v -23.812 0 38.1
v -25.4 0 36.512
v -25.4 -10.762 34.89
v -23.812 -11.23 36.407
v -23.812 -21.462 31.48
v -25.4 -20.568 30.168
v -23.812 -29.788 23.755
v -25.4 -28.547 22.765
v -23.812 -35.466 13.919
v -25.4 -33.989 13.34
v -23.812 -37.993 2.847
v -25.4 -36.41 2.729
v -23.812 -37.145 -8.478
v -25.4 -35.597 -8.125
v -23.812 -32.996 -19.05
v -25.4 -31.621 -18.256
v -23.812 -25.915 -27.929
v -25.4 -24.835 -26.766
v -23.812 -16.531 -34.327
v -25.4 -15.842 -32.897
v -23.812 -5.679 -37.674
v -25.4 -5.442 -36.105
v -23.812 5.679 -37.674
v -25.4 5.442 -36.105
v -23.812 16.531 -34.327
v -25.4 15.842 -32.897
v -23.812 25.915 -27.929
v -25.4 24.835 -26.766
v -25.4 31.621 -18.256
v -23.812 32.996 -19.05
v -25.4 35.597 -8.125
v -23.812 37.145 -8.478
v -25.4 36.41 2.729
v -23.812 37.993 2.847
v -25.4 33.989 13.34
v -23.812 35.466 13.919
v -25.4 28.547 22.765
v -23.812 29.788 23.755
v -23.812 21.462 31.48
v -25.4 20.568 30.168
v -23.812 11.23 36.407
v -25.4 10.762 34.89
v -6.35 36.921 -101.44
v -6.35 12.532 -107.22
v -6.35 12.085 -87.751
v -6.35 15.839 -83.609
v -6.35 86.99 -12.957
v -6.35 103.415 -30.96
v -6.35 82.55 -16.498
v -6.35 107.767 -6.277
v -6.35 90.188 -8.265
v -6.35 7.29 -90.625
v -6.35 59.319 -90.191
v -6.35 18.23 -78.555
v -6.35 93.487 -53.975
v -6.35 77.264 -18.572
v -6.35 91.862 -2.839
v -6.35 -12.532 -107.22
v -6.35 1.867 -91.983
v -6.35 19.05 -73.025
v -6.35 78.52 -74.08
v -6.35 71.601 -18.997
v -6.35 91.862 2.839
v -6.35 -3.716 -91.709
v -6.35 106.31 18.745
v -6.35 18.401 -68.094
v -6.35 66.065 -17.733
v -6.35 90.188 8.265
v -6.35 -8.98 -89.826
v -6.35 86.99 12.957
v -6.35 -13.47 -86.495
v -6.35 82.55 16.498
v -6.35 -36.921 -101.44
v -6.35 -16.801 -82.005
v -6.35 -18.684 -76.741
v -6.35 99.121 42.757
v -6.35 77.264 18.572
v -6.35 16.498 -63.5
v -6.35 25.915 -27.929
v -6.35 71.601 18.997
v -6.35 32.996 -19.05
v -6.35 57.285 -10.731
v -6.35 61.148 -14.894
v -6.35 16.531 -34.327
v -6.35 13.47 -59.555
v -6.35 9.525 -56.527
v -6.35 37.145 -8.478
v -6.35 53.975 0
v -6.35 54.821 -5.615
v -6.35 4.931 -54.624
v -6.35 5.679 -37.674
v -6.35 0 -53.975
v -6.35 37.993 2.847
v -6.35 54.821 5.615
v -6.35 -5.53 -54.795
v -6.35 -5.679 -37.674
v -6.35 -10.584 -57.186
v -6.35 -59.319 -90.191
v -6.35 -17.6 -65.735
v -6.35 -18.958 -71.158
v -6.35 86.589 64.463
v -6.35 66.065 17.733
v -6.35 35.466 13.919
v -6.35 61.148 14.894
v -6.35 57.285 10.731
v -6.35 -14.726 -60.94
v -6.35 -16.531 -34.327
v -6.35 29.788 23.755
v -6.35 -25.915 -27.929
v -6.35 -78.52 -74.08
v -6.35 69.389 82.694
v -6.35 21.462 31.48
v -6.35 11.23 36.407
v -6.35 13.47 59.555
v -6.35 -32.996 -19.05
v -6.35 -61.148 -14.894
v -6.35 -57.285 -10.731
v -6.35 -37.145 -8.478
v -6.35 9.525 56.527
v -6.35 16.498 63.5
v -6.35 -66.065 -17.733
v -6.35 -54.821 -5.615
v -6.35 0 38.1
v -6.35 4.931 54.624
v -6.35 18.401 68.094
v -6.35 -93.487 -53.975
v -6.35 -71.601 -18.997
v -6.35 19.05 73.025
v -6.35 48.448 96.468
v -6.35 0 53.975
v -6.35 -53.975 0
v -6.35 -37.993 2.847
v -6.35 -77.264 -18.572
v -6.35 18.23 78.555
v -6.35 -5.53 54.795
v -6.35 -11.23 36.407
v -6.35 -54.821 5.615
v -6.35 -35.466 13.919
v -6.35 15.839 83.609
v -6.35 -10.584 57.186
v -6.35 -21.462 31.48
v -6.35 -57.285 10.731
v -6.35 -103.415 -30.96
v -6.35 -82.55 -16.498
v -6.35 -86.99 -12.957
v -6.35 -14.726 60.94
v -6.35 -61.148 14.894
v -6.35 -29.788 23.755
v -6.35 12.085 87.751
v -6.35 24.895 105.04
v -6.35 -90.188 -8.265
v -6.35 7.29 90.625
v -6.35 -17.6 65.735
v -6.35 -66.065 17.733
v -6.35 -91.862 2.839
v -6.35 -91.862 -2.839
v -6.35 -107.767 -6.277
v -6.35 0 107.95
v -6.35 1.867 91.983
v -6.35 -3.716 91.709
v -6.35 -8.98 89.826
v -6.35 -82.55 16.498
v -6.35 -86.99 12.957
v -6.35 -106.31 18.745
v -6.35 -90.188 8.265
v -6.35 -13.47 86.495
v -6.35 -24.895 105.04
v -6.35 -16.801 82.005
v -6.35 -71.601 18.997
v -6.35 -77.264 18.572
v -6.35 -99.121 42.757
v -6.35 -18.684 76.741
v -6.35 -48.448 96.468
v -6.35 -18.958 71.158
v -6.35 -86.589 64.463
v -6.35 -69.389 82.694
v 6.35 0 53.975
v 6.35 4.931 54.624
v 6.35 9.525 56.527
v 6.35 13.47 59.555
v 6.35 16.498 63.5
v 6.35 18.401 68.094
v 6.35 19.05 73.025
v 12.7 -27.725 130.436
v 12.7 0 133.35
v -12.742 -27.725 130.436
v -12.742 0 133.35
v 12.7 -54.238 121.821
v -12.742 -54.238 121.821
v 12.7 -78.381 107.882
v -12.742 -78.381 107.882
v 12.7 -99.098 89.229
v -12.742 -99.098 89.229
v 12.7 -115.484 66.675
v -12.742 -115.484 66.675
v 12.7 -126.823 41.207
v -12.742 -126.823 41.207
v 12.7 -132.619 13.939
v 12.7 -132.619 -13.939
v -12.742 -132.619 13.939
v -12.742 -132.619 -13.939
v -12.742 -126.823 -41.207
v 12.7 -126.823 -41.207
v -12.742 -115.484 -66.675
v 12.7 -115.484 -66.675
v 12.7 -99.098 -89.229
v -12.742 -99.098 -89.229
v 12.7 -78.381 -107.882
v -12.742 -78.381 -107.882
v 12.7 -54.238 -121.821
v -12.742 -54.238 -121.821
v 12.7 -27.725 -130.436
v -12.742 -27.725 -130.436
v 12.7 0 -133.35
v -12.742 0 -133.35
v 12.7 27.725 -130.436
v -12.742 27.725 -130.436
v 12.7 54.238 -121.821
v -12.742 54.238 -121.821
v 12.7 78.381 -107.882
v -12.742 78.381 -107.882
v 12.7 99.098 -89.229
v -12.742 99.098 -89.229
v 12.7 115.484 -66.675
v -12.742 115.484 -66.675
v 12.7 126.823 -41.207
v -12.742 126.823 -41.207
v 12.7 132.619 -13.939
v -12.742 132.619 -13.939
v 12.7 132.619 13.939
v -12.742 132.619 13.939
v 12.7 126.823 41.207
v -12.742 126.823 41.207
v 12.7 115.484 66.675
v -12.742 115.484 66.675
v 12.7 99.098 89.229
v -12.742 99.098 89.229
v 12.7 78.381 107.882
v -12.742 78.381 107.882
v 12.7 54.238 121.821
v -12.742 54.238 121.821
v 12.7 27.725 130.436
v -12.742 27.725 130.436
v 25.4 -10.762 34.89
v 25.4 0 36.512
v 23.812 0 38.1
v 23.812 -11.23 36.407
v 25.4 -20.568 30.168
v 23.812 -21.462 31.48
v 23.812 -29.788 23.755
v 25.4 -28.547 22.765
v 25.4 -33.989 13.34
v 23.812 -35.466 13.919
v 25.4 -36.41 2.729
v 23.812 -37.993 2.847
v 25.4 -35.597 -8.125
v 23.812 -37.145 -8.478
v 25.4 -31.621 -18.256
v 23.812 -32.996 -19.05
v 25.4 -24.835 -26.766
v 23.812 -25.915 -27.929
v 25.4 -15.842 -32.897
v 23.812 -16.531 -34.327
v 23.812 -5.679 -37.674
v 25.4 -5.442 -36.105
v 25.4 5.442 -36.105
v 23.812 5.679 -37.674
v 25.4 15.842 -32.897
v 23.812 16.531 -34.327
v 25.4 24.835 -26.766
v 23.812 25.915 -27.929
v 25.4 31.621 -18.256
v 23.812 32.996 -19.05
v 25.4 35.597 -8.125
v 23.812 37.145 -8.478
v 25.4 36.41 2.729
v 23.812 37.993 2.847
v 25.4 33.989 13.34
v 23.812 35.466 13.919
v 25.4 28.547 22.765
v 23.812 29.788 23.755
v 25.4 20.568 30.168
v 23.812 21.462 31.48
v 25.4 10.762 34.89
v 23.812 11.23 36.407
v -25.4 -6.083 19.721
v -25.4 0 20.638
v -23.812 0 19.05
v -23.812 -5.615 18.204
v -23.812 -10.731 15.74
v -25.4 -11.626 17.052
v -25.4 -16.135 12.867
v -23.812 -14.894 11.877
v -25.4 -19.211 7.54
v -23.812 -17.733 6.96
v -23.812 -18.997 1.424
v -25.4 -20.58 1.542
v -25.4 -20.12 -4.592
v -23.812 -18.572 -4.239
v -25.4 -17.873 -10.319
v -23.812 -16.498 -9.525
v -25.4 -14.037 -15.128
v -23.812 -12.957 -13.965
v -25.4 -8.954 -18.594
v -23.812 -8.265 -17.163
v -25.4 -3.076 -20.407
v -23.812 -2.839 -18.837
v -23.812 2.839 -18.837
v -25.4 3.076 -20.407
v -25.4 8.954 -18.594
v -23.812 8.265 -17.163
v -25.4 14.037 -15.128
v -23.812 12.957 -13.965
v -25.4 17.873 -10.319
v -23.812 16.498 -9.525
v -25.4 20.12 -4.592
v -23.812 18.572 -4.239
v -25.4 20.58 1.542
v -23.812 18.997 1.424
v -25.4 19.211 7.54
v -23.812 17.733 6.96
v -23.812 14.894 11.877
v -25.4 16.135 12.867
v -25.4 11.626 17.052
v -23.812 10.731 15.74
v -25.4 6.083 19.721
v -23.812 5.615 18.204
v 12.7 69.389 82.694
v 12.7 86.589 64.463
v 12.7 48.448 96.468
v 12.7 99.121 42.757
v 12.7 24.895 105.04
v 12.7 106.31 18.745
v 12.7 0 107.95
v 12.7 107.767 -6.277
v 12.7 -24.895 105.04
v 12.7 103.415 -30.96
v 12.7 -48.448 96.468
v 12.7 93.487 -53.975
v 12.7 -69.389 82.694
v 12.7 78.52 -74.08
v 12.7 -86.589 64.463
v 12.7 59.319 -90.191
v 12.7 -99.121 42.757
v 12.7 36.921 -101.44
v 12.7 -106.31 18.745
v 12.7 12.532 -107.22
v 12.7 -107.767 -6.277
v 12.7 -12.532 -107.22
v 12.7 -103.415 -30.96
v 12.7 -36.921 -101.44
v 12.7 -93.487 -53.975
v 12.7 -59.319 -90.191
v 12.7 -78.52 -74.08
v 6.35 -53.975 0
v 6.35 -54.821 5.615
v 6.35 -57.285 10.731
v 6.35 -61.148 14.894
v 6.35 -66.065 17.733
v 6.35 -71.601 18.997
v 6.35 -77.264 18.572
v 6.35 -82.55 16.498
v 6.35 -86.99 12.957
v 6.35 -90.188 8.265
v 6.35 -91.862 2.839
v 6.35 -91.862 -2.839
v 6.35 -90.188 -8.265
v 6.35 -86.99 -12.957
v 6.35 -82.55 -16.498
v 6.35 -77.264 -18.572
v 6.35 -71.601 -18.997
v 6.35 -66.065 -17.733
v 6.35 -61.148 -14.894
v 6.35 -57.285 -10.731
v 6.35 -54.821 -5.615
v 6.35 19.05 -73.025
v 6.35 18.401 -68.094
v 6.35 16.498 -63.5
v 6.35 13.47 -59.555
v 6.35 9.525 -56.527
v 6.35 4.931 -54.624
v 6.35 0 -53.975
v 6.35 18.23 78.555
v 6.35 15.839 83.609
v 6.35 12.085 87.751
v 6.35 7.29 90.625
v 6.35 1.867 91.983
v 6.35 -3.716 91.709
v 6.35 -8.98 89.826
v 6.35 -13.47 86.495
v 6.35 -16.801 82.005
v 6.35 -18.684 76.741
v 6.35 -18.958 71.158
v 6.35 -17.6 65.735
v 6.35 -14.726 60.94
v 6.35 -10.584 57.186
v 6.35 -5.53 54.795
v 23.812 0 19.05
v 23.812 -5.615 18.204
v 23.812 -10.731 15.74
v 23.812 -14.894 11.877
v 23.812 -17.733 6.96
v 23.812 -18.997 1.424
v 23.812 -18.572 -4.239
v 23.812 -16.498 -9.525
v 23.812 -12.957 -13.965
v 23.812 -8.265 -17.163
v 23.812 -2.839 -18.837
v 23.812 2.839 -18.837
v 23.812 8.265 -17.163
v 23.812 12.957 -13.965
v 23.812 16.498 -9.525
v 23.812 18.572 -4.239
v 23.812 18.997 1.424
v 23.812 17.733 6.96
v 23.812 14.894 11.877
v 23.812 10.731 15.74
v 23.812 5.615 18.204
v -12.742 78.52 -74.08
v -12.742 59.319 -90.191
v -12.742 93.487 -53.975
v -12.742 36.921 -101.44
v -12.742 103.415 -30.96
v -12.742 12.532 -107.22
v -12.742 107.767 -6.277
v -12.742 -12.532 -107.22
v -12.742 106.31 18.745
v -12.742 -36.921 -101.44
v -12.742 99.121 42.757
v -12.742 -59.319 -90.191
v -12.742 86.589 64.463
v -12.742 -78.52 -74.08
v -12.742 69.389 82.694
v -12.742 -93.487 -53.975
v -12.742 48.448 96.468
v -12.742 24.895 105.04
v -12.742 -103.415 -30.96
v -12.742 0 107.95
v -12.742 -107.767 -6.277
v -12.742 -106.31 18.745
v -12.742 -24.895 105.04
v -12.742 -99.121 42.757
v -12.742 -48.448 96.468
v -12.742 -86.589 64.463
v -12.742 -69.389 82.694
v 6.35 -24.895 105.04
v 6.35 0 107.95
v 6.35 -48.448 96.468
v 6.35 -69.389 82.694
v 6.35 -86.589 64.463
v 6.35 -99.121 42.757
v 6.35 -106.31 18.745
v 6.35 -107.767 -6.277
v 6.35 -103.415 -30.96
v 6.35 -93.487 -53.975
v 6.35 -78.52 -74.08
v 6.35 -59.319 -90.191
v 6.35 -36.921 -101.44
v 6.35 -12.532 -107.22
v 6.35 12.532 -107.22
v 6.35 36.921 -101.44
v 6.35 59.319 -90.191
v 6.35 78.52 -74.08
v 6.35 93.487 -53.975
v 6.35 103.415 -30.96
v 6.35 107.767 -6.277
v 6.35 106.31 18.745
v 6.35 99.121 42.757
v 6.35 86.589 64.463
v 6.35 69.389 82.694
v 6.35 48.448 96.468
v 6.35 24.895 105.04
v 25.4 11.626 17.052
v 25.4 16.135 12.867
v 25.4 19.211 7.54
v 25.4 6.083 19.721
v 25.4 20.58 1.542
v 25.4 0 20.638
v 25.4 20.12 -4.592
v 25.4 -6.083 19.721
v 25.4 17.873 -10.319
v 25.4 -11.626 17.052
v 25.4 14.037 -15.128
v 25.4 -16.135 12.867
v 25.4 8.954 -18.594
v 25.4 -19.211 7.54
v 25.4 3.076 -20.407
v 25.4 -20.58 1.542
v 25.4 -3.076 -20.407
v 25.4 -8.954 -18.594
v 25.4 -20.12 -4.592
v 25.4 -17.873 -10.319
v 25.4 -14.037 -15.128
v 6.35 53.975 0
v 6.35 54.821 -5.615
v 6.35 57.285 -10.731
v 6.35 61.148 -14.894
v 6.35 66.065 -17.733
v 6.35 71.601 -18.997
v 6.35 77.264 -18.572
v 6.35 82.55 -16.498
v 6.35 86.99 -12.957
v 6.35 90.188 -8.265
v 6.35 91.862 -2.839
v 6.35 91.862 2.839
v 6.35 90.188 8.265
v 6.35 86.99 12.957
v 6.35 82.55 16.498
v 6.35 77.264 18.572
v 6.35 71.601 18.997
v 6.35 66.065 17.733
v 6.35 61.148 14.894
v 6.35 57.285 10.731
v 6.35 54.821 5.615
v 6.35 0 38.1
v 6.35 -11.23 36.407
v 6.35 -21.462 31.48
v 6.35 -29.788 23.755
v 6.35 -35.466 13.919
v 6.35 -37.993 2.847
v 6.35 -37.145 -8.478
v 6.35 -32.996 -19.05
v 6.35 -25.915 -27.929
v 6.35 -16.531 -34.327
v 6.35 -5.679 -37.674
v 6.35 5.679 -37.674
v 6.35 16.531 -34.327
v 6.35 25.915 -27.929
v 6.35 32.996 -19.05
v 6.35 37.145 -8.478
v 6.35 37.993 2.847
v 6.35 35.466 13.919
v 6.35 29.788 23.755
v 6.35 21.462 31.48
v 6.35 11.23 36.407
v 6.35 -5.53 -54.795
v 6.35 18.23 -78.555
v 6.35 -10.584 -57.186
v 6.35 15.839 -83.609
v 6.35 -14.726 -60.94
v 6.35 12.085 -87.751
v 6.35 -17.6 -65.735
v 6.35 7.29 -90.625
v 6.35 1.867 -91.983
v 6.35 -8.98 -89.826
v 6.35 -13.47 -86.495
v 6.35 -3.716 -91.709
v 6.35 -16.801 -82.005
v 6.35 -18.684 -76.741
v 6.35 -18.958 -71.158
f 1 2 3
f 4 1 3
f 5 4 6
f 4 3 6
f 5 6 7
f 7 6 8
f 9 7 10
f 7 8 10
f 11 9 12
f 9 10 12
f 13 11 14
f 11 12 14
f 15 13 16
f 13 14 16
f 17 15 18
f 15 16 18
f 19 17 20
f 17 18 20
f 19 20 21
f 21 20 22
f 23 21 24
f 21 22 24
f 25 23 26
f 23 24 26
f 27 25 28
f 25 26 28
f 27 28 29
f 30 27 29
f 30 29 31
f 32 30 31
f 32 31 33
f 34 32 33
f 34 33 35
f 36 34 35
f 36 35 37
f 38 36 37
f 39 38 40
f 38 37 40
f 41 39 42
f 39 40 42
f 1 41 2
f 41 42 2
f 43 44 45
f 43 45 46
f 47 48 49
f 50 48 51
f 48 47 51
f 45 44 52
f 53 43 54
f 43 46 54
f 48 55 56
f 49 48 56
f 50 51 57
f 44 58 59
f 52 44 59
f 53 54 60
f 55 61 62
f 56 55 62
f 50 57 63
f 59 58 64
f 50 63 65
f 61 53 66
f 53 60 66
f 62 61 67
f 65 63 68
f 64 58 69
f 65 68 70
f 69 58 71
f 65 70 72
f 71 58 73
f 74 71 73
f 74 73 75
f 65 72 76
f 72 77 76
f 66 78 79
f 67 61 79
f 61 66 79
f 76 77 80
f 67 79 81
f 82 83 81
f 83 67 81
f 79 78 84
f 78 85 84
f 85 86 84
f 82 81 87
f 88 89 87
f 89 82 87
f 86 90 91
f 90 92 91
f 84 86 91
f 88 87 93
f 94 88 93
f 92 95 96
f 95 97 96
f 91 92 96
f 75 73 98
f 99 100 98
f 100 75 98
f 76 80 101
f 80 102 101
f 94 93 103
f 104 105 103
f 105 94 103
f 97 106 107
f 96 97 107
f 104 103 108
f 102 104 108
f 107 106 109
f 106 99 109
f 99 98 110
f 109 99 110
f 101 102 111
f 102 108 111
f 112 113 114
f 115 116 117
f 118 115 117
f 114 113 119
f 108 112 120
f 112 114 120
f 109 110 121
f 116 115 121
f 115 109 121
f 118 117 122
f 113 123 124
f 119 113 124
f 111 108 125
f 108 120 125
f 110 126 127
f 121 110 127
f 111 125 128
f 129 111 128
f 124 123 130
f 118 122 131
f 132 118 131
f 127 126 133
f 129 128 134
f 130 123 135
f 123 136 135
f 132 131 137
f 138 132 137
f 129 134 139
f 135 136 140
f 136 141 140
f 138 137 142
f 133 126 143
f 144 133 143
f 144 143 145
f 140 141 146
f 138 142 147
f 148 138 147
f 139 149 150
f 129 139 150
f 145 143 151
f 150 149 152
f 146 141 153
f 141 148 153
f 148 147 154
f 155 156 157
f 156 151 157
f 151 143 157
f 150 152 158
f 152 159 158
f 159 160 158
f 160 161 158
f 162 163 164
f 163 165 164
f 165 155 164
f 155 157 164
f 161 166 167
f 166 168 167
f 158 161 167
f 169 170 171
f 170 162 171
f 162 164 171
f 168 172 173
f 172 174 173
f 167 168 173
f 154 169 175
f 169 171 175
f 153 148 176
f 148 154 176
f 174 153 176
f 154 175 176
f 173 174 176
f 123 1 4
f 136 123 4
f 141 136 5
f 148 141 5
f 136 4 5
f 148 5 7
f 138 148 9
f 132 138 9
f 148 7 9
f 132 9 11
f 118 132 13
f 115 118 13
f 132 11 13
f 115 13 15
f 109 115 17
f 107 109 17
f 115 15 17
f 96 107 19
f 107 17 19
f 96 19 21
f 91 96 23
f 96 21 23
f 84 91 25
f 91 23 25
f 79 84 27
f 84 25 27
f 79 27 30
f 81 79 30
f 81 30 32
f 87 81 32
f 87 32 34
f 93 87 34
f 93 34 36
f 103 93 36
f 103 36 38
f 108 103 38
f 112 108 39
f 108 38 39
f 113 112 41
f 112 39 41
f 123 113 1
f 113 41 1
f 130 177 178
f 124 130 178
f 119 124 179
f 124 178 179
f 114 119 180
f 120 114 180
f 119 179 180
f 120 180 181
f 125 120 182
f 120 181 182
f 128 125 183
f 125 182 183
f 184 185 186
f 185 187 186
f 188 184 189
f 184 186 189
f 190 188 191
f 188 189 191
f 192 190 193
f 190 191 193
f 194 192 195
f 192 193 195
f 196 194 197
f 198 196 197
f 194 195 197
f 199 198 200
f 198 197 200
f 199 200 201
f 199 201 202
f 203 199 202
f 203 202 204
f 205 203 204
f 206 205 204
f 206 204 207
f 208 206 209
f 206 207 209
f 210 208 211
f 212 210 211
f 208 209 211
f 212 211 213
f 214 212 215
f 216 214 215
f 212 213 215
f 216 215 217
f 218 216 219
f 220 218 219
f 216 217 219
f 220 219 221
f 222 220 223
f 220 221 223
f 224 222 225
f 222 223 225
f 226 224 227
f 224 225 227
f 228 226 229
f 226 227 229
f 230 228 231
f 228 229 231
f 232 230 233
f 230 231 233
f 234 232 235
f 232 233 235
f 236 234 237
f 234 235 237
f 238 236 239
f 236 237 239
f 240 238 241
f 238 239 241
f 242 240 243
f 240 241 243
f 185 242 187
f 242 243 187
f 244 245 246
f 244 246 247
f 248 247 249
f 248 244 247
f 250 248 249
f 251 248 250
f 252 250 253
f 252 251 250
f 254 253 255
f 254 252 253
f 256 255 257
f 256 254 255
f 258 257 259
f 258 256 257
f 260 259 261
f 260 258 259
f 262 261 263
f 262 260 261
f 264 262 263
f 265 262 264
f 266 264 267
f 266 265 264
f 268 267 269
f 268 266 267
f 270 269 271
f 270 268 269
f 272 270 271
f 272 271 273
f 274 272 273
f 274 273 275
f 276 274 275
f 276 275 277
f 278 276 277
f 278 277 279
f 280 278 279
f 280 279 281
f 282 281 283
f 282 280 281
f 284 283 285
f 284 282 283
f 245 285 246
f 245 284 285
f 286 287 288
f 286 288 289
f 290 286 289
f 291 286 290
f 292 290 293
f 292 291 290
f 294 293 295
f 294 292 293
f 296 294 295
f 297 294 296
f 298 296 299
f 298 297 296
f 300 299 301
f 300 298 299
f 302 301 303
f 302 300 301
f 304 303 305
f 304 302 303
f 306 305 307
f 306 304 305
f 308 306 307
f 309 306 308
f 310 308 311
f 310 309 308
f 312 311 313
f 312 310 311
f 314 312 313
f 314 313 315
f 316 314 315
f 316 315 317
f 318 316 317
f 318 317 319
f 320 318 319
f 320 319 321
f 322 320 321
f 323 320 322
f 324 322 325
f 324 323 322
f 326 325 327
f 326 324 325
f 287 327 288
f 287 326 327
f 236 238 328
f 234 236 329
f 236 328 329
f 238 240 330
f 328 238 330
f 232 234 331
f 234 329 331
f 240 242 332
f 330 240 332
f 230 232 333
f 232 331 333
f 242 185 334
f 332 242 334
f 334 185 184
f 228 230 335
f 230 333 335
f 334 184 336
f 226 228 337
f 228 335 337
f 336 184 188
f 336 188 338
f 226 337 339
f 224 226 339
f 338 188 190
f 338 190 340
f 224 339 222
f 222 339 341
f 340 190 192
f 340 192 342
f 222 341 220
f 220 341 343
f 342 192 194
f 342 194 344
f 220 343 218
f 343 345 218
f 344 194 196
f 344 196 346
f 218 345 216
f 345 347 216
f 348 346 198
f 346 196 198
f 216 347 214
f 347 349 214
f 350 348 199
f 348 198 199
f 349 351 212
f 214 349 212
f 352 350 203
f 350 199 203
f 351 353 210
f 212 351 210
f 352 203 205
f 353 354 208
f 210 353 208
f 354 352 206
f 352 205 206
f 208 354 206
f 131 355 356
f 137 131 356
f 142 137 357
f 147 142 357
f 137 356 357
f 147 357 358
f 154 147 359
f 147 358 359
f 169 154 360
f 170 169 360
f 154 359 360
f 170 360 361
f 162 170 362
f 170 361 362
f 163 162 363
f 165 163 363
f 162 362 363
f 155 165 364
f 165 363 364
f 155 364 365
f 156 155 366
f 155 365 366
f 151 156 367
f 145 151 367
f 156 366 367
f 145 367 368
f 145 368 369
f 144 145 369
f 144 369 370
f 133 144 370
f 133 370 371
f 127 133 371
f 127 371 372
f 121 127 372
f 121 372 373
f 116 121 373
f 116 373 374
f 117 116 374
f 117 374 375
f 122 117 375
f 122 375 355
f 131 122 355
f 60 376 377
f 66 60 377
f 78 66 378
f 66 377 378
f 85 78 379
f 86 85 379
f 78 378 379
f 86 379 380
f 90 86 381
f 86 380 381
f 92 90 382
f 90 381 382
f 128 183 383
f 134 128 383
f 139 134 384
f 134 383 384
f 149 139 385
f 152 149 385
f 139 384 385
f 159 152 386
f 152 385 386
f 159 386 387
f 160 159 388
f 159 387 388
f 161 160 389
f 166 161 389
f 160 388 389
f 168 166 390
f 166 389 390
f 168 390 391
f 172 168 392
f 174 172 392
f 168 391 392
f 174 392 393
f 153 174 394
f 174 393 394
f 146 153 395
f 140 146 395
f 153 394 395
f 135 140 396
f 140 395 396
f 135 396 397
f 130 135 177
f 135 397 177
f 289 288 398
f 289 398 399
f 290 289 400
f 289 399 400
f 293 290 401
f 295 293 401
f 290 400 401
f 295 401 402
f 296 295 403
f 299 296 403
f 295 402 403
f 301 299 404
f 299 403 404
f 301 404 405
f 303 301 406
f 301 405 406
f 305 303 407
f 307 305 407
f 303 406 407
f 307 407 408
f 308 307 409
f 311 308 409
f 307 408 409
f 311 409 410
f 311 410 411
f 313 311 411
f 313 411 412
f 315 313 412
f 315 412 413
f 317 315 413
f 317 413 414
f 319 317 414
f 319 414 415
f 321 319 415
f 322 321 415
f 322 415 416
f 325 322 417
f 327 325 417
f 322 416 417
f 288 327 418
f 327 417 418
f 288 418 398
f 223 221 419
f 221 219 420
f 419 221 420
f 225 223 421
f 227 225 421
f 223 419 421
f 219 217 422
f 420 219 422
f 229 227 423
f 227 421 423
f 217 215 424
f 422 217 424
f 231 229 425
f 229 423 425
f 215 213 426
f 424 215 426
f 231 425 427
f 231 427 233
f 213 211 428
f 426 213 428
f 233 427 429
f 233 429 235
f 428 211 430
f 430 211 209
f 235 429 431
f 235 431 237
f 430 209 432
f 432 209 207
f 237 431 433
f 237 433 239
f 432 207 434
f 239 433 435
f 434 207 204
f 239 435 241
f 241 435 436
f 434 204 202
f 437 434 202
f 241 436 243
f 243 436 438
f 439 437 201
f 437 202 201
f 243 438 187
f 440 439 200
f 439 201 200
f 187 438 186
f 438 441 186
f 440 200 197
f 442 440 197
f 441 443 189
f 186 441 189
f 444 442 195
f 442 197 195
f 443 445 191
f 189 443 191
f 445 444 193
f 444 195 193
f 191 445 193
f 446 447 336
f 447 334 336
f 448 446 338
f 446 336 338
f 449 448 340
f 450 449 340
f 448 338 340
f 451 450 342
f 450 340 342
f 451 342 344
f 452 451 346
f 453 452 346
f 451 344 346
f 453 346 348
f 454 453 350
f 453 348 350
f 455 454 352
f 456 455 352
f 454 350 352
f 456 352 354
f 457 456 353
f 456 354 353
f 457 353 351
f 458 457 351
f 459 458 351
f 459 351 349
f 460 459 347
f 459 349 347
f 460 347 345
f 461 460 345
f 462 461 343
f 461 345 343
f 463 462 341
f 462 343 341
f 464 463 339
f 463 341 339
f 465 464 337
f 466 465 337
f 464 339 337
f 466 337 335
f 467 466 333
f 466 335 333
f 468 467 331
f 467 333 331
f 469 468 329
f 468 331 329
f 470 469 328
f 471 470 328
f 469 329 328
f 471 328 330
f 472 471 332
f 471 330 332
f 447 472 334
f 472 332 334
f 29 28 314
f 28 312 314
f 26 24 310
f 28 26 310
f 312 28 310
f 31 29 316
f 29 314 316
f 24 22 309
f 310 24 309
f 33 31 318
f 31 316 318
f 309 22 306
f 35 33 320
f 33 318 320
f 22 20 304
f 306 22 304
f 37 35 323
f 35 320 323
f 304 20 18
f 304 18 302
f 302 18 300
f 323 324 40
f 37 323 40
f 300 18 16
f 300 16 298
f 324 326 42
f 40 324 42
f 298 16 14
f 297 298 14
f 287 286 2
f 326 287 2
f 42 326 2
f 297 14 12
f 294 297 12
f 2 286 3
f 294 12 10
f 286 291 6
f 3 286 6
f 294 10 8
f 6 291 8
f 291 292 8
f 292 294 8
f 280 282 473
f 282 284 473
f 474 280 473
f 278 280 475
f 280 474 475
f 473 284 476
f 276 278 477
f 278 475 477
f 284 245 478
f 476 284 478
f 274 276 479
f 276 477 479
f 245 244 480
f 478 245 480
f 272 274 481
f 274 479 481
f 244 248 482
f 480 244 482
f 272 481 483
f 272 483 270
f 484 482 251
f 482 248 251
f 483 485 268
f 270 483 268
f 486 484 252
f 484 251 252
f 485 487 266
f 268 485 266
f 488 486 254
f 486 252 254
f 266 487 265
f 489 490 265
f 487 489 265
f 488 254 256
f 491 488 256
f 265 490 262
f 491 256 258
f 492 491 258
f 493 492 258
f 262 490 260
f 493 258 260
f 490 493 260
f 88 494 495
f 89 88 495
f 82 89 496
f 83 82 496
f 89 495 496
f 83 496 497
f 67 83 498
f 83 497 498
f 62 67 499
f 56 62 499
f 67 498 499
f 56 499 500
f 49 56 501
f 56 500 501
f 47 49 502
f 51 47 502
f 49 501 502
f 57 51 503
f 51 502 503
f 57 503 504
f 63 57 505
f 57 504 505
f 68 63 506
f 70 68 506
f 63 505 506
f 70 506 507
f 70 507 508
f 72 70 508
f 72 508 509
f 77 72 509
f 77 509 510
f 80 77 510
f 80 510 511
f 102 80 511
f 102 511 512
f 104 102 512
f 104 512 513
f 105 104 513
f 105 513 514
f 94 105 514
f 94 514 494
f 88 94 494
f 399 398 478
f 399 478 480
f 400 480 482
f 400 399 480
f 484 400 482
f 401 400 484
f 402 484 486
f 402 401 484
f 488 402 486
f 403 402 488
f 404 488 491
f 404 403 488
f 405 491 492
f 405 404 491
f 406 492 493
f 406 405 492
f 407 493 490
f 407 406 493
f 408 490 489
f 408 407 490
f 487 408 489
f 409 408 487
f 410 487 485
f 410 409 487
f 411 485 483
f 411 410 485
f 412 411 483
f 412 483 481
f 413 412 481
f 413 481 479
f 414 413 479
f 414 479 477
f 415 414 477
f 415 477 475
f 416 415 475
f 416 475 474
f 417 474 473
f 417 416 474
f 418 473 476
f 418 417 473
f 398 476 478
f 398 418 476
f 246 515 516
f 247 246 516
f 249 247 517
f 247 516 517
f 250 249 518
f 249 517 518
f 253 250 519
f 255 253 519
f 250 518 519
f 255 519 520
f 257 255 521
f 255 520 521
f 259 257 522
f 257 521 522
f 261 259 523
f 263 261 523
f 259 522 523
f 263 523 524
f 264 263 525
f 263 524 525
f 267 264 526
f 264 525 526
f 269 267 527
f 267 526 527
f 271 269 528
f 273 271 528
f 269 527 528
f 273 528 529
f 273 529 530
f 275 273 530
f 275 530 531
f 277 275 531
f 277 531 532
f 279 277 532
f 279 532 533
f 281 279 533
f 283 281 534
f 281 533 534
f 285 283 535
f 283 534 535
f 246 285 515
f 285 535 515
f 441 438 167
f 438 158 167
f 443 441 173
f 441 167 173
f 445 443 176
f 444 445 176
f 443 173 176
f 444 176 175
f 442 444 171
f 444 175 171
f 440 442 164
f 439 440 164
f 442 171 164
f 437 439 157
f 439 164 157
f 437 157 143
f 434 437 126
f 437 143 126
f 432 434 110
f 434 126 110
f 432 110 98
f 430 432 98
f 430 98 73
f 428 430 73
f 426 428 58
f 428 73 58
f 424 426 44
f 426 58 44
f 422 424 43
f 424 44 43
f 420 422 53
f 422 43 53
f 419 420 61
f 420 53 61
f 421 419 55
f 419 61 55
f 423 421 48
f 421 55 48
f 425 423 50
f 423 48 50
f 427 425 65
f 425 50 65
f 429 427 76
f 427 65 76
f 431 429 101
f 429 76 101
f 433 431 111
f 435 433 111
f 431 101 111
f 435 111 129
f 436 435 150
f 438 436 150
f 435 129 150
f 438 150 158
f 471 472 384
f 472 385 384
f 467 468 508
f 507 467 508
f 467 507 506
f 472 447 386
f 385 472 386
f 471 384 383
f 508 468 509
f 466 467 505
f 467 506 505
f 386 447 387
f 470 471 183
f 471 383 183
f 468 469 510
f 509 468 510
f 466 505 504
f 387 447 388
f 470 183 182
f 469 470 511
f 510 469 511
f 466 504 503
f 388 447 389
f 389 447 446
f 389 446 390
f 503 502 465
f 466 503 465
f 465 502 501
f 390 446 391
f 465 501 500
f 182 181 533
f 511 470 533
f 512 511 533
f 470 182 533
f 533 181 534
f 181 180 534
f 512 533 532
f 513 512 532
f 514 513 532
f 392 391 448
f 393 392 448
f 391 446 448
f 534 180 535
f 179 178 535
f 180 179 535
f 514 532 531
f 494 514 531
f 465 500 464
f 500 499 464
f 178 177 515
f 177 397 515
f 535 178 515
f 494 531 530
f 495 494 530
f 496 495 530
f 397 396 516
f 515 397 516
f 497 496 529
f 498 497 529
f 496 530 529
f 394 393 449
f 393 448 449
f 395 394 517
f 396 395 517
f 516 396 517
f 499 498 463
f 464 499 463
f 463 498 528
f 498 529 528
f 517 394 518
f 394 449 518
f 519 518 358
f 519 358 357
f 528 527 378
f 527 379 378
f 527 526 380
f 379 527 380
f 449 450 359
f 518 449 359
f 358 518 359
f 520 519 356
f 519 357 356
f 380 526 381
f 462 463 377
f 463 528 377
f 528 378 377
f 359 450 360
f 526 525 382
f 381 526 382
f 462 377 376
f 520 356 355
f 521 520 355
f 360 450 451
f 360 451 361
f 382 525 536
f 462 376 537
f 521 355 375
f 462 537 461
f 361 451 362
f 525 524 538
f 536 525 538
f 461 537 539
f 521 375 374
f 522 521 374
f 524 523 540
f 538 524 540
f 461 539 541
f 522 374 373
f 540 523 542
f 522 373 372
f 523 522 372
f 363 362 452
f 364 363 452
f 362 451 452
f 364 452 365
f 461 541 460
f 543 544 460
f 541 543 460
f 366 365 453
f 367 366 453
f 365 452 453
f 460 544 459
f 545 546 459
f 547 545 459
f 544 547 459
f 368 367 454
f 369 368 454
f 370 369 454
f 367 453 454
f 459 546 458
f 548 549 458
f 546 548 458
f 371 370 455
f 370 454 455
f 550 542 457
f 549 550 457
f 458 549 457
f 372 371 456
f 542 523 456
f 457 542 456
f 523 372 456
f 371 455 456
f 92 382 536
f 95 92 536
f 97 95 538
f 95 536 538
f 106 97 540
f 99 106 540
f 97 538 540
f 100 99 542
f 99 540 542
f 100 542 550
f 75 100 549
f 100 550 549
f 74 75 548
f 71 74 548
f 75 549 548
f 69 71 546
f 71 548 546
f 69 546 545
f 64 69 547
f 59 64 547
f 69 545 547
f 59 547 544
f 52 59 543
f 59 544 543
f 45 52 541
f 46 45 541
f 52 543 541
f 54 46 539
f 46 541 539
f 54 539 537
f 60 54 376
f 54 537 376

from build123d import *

# Parameters (mm, degrees)
F2_R     = 19.05
F3_DEPTH = 25.4
F4_SIZE  = 1.5875
F5_SIZE  = 1.5875


with BuildPart() as f1:
    # F0 (on Front) → F1 (revolve)
    with BuildSketch(Plane.XZ):
        Polygon((0, 107.95), (6.35, 107.95), (12.7, 107.95), (12.7, 120.65), (12.7, 133.35), (6.35, 133.35), (0, 133.35), (-12.741878, 133.35), (-12.741878, 107.95), (-6.35, 107.95), align=None)
        Polygon((-25.4, 19.05), (0, 19.05), (25.4, 19.05), (25.4, 38.1), (6.35, 38.1), (6.35, 107.95), (0, 107.95), (-6.35, 107.95), (-6.35, 38.1), (-25.4, 38.1), align=None)
    revolve(axis=Axis((38.116653, 0, 0), (1, 0, 0)))

    # F2 (on face) → F3 (cut)
    with BuildSketch(Plane.YZ.offset(6.35)):
        with Locations((-73.025, 0)):
            Circle(F2_R)
        with BuildLine():
            ThreePointArc((19.05, 73.025), (-13.470384, 86.495384), (0, 53.975))
            ThreePointArc((0, 53.975), (13.470384, 59.554616), (19.05, 73.025))
        make_face()
        with BuildLine():
            ThreePointArc((92.075, 0), (73.025, 19.05), (53.975, 0))
            ThreePointArc((53.975, 0), (73.025, -19.05), (92.075, 0))
        make_face()
        with BuildLine():
            ThreePointArc((19.05, -73.025), (13.470384, -59.554616), (0, -53.975))
            ThreePointArc((0, -53.975), (-13.470384, -86.495384), (19.05, -73.025))
        make_face()
    extrude(amount=-F3_DEPTH, mode=Mode.SUBTRACT)

    # F4
    f4_edges = [f1.edges().sort_by_distance(p)[0] for p in [
        (25.4, 0, -38.1),
        (25.4, 0, -19.05),
    ]]
    chamfer(f4_edges, length=F4_SIZE)

    # F5
    f5_edges = [f1.edges().sort_by_distance(p)[0] for p in [
        (-25.4, 0, -38.1),
        (-25.4, 0, -19.05),
    ]]
    chamfer(f5_edges, length=F5_SIZE)


solid = f1.part
